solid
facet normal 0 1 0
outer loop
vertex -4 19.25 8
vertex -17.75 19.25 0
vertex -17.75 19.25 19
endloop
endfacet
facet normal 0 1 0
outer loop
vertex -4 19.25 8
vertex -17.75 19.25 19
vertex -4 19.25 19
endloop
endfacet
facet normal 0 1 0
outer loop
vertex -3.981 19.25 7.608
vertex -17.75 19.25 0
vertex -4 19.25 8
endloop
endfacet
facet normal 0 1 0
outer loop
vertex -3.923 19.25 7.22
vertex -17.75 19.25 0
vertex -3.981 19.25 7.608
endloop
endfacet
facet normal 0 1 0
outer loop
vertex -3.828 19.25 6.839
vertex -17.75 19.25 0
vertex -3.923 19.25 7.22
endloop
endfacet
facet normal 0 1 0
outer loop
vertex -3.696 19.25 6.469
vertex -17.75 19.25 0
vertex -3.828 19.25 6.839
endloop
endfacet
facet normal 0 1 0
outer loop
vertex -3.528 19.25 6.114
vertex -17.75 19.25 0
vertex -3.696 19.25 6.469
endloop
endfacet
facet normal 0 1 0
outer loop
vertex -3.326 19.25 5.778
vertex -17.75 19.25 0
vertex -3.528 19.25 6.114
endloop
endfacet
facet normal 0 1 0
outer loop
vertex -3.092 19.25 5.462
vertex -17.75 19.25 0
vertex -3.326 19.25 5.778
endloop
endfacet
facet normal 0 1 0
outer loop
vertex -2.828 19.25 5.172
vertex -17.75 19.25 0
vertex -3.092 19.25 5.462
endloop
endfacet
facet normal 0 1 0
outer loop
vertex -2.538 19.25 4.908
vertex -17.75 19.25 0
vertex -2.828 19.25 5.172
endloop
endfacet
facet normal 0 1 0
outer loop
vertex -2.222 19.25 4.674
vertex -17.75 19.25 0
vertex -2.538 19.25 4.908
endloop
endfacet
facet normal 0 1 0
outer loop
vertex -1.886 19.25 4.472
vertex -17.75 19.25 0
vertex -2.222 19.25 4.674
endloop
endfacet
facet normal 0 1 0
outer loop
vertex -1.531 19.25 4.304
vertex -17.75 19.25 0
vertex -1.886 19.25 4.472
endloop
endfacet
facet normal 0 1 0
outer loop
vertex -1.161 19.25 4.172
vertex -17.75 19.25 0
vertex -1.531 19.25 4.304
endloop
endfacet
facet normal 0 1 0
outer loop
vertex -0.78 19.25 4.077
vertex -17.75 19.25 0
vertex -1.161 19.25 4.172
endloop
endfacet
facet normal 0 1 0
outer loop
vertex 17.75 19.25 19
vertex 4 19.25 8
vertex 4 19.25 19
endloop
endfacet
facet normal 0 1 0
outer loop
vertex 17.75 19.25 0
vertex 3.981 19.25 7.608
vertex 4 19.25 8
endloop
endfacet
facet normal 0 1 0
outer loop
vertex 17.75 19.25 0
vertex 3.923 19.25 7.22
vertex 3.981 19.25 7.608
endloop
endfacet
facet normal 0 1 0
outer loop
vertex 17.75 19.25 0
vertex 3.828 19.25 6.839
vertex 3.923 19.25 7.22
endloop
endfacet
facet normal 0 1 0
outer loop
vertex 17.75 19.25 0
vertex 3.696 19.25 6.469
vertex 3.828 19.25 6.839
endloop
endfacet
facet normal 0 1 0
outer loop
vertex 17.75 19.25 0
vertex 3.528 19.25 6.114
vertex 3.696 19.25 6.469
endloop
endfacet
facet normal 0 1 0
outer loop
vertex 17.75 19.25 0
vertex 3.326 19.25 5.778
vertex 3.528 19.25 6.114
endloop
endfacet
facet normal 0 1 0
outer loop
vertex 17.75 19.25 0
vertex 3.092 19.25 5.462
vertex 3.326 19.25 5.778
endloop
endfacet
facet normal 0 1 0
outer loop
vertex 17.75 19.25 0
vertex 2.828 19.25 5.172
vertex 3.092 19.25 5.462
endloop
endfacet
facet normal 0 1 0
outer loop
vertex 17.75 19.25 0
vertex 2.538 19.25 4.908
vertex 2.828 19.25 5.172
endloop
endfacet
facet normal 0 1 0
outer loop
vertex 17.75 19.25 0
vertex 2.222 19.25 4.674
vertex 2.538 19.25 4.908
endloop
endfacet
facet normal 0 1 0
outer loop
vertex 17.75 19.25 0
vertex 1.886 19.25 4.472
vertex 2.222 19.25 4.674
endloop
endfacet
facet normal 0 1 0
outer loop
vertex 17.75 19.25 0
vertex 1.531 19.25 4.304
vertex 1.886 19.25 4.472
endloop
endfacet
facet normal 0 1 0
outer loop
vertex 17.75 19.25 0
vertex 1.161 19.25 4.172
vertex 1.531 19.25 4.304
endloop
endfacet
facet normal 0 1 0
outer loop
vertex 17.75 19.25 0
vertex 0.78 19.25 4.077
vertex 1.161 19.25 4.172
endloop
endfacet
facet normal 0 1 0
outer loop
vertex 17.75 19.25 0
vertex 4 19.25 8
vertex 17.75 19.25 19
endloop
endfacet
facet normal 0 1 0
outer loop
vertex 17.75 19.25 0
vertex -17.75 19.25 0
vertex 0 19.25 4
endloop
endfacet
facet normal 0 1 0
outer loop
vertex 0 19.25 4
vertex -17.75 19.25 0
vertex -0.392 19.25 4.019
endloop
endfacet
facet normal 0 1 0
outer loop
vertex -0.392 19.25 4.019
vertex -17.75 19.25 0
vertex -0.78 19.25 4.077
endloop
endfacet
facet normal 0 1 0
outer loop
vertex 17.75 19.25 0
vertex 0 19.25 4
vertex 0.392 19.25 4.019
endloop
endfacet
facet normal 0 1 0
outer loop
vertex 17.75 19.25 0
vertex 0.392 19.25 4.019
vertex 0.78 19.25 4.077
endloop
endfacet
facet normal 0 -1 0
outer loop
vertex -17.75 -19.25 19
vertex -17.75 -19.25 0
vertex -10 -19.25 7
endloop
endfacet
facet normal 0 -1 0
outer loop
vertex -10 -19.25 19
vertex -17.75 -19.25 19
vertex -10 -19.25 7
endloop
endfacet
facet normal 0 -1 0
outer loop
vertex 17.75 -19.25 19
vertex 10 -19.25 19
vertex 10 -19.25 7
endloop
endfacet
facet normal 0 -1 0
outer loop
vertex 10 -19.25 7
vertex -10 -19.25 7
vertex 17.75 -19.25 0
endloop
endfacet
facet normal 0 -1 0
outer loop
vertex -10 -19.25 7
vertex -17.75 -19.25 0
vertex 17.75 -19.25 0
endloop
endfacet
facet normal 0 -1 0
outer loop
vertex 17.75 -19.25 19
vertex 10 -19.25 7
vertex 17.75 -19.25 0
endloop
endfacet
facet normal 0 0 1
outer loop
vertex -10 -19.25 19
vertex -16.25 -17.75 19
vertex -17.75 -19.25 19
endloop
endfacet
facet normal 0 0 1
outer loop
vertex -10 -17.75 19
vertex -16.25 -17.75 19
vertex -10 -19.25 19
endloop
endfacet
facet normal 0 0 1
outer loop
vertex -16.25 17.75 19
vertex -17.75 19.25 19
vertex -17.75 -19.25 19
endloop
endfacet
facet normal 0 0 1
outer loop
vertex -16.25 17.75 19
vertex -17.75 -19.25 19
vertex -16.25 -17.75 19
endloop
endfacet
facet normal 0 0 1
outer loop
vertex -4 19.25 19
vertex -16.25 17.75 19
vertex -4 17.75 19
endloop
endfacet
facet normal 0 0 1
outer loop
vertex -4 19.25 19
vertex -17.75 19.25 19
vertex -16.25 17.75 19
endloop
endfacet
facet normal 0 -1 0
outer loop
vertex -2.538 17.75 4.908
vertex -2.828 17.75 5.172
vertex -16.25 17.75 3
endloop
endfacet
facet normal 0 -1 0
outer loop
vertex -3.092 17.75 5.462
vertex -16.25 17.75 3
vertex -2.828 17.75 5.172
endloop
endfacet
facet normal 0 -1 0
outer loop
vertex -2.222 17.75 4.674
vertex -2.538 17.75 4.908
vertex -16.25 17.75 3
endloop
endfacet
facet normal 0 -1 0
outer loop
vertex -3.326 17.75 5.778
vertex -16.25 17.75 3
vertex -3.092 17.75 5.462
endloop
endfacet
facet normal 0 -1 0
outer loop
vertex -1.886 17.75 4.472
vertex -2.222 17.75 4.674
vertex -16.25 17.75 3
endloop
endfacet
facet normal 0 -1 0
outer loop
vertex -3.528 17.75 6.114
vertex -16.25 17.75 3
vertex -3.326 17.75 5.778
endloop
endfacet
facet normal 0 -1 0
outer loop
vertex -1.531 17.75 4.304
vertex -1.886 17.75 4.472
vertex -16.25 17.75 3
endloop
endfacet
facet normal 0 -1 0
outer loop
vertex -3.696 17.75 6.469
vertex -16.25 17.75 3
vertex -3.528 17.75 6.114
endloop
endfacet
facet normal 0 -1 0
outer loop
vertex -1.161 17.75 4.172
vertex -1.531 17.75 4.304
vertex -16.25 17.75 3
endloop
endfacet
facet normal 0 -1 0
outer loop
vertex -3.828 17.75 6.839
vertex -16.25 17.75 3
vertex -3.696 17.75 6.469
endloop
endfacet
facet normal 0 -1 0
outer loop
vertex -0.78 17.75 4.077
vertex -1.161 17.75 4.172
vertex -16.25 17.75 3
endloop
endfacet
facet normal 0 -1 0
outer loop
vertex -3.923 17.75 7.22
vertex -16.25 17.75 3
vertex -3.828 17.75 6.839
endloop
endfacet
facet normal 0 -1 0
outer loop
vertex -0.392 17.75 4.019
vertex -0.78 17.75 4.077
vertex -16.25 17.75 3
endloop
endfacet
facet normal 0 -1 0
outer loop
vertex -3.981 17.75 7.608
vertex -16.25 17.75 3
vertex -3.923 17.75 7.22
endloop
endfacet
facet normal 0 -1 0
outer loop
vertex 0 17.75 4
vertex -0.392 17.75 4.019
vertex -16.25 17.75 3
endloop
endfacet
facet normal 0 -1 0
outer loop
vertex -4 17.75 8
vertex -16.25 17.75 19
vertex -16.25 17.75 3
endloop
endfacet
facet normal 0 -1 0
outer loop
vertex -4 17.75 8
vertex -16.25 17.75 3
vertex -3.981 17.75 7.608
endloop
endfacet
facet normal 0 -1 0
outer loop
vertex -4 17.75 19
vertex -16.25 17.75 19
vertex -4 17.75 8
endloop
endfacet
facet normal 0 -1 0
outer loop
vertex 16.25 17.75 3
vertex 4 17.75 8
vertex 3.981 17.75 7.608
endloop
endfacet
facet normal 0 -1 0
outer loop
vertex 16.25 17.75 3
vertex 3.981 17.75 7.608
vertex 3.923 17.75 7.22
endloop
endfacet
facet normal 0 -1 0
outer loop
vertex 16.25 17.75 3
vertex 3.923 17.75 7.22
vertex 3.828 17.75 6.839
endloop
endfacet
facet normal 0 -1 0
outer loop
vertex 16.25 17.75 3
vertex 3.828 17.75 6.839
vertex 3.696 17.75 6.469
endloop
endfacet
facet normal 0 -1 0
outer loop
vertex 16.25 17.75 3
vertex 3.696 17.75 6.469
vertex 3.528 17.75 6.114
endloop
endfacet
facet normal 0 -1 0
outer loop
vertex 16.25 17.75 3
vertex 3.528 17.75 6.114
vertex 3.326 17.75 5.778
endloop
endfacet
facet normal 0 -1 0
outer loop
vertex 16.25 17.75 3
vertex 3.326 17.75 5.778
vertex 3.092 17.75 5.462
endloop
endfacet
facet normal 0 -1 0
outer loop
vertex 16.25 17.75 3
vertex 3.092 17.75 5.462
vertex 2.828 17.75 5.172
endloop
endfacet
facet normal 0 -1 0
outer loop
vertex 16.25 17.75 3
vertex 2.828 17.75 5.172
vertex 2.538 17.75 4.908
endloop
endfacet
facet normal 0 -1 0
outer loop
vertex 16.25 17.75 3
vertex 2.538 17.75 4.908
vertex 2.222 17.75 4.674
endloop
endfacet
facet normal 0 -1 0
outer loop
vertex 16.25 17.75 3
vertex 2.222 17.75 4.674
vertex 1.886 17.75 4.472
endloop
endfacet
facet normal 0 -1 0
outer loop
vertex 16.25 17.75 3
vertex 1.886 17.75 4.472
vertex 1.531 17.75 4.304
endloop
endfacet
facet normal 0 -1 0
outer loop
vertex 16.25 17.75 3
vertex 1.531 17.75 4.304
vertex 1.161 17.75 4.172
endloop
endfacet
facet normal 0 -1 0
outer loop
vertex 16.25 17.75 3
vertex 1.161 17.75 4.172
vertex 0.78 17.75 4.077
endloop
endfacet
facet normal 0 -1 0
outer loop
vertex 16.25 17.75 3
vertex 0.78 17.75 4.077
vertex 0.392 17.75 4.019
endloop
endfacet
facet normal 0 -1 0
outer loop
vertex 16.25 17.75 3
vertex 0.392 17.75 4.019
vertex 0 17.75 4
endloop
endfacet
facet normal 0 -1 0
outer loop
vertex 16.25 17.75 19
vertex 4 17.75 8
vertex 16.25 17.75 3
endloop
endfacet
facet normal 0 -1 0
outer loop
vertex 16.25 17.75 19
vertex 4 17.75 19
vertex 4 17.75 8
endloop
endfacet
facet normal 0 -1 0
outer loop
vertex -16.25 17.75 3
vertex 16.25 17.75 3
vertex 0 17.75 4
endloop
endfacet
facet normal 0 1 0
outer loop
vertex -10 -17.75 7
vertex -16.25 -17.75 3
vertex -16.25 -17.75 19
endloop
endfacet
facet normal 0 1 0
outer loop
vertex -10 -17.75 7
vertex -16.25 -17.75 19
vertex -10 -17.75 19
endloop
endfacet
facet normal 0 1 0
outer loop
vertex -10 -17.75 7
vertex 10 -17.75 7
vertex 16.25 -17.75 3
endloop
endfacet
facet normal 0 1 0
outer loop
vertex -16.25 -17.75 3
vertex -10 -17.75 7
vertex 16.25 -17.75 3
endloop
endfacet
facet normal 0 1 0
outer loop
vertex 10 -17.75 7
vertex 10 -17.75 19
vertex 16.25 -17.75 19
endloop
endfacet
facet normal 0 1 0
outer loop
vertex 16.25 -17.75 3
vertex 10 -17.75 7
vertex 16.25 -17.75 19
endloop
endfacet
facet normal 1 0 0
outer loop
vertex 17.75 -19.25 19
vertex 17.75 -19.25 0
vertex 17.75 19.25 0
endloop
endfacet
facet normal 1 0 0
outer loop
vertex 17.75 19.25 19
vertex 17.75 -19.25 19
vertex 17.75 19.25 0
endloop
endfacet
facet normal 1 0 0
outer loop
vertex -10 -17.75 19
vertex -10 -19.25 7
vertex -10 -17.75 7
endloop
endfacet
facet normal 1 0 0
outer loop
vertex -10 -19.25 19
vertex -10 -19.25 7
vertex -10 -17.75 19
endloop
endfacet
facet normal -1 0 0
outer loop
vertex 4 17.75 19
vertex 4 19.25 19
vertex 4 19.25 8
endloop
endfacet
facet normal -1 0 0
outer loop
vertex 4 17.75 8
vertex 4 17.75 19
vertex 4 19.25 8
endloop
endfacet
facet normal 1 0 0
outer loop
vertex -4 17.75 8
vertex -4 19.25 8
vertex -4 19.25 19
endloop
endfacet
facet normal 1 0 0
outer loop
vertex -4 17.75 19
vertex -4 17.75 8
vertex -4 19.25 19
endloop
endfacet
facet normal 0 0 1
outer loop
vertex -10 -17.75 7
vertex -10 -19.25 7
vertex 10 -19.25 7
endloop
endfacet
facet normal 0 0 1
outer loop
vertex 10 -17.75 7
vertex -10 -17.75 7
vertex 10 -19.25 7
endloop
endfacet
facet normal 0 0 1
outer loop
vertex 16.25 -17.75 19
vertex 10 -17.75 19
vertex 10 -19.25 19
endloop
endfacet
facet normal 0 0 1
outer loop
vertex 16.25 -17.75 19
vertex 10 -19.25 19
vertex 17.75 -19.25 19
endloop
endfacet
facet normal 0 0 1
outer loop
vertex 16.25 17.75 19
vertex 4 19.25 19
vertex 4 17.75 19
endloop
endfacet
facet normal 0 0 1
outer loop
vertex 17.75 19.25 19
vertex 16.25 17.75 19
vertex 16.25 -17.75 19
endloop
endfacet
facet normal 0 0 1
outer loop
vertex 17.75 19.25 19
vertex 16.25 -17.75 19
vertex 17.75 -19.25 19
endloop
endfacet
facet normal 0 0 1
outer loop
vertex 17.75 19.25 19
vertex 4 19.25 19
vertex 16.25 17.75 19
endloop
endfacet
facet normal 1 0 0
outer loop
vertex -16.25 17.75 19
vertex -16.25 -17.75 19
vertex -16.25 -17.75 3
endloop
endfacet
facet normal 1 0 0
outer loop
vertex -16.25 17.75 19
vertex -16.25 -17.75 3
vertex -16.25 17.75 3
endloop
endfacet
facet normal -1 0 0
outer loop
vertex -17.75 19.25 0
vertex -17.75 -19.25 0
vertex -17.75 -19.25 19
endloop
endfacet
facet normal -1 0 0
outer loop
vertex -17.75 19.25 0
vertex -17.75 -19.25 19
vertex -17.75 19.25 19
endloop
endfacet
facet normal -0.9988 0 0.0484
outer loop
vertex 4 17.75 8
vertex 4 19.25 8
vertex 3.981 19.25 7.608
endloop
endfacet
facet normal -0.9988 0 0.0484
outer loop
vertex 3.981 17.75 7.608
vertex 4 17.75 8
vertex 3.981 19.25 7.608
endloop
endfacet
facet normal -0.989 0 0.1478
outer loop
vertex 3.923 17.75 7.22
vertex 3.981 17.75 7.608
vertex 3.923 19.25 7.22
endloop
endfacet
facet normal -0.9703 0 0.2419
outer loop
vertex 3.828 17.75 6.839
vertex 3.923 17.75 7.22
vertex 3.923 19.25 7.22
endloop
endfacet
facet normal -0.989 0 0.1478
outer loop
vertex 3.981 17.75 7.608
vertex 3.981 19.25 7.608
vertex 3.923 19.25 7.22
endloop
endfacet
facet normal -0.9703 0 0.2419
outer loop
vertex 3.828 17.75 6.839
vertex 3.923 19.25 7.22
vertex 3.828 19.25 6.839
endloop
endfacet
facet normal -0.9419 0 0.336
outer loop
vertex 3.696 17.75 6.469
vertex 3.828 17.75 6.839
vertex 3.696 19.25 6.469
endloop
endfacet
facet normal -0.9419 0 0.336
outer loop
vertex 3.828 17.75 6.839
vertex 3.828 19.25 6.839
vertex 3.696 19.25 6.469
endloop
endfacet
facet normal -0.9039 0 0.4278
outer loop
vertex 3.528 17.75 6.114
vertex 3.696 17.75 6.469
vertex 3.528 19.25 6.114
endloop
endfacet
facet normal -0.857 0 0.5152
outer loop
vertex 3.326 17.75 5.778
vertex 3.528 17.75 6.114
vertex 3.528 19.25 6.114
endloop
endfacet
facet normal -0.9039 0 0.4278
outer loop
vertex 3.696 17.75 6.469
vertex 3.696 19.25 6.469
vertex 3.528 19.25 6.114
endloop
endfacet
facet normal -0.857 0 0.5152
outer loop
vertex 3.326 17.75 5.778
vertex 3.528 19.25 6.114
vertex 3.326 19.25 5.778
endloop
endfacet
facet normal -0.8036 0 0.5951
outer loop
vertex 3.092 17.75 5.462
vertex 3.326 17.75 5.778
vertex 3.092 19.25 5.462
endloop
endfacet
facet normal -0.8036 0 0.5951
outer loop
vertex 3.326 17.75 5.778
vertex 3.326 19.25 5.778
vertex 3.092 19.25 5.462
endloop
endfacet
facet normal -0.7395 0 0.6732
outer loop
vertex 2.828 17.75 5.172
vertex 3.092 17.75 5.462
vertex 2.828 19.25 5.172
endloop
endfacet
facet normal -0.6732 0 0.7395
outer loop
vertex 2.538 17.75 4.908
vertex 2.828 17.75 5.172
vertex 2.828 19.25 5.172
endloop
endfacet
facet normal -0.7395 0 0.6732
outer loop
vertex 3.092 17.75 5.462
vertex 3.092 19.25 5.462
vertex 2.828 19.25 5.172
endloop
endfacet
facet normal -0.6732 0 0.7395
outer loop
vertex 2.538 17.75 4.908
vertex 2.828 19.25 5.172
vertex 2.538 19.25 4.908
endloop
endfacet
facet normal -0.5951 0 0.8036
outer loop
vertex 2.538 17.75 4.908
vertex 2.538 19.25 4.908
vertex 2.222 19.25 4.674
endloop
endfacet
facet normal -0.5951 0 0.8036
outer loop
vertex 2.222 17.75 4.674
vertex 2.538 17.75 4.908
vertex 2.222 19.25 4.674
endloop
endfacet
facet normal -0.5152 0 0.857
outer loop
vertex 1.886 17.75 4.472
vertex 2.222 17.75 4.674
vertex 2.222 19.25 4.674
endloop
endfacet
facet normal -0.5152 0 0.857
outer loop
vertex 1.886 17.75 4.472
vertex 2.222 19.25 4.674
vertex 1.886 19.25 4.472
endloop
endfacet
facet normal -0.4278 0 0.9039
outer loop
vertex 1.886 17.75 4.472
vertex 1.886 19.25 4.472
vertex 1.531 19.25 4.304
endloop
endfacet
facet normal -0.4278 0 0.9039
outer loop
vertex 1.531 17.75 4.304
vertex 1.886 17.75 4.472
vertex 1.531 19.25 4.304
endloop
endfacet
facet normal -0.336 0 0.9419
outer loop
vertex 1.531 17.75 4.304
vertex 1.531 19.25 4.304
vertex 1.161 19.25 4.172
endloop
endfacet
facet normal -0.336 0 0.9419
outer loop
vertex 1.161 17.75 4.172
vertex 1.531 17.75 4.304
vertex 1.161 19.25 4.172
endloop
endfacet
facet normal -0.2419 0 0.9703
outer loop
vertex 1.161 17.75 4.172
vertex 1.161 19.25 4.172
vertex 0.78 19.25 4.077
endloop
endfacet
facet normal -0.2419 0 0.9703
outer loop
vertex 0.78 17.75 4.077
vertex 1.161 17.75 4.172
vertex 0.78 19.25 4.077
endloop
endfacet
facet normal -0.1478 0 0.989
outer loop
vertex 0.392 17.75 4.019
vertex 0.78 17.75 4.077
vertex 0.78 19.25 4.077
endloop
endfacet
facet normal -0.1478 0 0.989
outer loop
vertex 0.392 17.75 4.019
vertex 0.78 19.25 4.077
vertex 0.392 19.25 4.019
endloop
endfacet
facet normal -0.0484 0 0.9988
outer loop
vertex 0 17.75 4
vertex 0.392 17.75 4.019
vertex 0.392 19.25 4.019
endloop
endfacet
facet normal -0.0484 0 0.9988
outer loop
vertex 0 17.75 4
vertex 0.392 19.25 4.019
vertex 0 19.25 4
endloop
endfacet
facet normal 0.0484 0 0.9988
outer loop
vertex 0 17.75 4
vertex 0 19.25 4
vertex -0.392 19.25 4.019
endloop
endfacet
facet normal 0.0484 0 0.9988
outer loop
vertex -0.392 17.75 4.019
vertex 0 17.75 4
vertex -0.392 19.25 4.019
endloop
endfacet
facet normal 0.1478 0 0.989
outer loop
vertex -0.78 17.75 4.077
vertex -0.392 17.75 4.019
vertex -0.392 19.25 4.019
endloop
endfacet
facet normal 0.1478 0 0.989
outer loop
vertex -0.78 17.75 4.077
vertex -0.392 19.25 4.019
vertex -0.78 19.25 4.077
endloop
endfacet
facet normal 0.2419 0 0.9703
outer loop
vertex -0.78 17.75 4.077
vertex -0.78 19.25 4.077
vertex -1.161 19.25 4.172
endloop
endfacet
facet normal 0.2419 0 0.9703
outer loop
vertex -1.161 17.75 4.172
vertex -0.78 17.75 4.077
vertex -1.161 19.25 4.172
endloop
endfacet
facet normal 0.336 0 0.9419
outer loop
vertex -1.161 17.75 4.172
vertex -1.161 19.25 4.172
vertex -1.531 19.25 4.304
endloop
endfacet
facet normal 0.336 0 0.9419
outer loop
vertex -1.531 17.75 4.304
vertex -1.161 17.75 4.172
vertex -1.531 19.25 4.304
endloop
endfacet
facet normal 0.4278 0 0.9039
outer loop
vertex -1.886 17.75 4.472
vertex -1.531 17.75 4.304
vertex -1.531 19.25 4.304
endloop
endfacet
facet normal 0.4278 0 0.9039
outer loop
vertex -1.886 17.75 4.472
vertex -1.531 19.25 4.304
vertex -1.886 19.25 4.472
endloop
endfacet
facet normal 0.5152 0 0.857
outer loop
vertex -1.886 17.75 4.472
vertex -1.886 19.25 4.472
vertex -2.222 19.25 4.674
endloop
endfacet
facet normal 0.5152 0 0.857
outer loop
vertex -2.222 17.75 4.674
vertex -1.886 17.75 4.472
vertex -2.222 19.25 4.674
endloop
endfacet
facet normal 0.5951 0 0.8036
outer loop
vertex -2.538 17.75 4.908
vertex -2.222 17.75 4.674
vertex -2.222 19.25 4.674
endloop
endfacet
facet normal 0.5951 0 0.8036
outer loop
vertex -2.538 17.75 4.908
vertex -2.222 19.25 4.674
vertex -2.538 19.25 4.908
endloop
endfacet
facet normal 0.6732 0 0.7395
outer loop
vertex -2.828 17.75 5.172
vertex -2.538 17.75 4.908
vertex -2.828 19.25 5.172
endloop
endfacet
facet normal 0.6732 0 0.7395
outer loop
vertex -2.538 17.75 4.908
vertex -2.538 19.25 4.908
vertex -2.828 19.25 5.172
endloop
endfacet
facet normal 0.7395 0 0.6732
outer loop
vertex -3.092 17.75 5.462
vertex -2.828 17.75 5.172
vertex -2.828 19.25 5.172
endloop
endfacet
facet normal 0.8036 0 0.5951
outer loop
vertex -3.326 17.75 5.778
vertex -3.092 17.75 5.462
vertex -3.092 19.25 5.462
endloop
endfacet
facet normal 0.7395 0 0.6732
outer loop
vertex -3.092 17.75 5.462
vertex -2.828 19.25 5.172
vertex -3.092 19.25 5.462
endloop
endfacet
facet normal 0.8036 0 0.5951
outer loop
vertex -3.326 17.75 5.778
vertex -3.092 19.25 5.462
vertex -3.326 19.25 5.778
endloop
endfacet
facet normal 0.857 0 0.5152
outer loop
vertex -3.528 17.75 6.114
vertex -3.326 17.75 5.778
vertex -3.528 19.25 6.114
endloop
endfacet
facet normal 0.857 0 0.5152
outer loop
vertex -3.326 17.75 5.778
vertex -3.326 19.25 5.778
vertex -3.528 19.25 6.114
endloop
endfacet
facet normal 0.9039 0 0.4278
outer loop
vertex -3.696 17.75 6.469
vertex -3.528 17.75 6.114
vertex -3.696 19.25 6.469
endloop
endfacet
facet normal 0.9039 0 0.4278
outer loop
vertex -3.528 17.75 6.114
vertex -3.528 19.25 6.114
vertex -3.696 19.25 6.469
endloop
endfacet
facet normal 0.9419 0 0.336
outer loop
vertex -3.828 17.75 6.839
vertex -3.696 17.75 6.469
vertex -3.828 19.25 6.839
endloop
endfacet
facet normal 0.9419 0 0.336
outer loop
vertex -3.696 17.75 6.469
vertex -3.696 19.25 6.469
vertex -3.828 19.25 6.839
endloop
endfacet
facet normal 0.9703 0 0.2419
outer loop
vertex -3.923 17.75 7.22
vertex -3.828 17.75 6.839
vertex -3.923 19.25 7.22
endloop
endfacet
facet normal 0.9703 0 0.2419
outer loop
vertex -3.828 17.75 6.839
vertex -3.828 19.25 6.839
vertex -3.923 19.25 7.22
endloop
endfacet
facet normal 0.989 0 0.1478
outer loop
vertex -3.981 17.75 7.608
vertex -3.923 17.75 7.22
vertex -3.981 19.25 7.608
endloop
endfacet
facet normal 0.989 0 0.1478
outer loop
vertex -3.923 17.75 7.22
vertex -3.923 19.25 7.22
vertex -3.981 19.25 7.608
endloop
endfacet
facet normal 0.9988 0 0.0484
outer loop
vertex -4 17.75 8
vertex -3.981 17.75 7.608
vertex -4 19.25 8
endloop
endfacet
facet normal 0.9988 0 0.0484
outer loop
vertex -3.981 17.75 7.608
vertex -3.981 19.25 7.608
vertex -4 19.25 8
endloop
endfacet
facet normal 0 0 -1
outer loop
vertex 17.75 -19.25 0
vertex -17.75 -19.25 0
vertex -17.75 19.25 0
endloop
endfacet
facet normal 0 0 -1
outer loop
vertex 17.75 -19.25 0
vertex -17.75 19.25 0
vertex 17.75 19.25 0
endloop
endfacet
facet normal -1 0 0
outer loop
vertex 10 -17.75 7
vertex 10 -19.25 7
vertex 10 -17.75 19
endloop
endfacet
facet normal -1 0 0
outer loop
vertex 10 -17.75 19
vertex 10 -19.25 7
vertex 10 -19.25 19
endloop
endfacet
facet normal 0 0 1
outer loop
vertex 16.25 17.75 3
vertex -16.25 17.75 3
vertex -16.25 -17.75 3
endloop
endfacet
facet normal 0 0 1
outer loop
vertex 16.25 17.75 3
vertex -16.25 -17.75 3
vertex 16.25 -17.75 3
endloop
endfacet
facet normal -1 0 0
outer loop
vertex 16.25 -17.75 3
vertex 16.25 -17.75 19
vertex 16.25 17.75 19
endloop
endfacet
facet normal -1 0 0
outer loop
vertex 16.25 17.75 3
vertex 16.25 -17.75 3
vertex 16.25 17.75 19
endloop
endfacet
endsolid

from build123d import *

# Parameters (mm, degrees)
ESQUISSE1_W             = 35.5
ESQUISSE1_H             = 38.5
BOSS_EXTRU_1_DEPTH      = 19
ESQUISSE3_W             = 32.5
ESQUISSE3_H             = 35.5
ENL_V_MAT_EXTRU_1_DEPTH = 16
ESQUISSE4_R             = 4
ENL_V_MAT_EXTRU_2_DEPTH = 5
ESQUISSE5_W             = 20
ESQUISSE5_H             = 12
ENL_V_MAT_EXTRU_3_DEPTH = 5


with BuildPart() as part:
    # Esquisse1 → Boss.-Extru.1 (new body)
    with BuildSketch(Plane.XY):
        Rectangle(ESQUISSE1_W, ESQUISSE1_H)
    extrude(amount=BOSS_EXTRU_1_DEPTH)

    # Esquisse3 → Enlèv. mat.-Extru.1 (cut)
    with BuildSketch(Plane.XY.offset(19)):
        Rectangle(ESQUISSE3_W, ESQUISSE3_H)
    extrude(amount=-ENL_V_MAT_EXTRU_1_DEPTH, mode=Mode.SUBTRACT)

    # Esquisse4 → Enlèv. mat.-Extru.2 (cut)
    with BuildSketch(Plane(origin=(0, 19.25, 0), x_dir=(1, 0, 0), z_dir=(0, 1, 0))):
        with BuildLine():
            ThreePointArc((4, -8), (0, -12), (-4, -8))
            Line((-4, -8), (-4, -19))
            Line((-4, -19), (4, -19))
            Line((4, -19), (4, -8))
        make_face()
        with Locations((0, -8)):
            Circle(ESQUISSE4_R)
    extrude(amount=-ENL_V_MAT_EXTRU_2_DEPTH, mode=Mode.SUBTRACT)

    # Esquisse5 → Enlèv. mat.-Extru.3 (cut)
    with BuildSketch(Plane.XZ.offset(19.25)):
        with Locations((0, 13)):
            Rectangle(ESQUISSE5_W, ESQUISSE5_H)
    extrude(amount=-ENL_V_MAT_EXTRU_3_DEPTH, mode=Mode.SUBTRACT)


solid = part.part
